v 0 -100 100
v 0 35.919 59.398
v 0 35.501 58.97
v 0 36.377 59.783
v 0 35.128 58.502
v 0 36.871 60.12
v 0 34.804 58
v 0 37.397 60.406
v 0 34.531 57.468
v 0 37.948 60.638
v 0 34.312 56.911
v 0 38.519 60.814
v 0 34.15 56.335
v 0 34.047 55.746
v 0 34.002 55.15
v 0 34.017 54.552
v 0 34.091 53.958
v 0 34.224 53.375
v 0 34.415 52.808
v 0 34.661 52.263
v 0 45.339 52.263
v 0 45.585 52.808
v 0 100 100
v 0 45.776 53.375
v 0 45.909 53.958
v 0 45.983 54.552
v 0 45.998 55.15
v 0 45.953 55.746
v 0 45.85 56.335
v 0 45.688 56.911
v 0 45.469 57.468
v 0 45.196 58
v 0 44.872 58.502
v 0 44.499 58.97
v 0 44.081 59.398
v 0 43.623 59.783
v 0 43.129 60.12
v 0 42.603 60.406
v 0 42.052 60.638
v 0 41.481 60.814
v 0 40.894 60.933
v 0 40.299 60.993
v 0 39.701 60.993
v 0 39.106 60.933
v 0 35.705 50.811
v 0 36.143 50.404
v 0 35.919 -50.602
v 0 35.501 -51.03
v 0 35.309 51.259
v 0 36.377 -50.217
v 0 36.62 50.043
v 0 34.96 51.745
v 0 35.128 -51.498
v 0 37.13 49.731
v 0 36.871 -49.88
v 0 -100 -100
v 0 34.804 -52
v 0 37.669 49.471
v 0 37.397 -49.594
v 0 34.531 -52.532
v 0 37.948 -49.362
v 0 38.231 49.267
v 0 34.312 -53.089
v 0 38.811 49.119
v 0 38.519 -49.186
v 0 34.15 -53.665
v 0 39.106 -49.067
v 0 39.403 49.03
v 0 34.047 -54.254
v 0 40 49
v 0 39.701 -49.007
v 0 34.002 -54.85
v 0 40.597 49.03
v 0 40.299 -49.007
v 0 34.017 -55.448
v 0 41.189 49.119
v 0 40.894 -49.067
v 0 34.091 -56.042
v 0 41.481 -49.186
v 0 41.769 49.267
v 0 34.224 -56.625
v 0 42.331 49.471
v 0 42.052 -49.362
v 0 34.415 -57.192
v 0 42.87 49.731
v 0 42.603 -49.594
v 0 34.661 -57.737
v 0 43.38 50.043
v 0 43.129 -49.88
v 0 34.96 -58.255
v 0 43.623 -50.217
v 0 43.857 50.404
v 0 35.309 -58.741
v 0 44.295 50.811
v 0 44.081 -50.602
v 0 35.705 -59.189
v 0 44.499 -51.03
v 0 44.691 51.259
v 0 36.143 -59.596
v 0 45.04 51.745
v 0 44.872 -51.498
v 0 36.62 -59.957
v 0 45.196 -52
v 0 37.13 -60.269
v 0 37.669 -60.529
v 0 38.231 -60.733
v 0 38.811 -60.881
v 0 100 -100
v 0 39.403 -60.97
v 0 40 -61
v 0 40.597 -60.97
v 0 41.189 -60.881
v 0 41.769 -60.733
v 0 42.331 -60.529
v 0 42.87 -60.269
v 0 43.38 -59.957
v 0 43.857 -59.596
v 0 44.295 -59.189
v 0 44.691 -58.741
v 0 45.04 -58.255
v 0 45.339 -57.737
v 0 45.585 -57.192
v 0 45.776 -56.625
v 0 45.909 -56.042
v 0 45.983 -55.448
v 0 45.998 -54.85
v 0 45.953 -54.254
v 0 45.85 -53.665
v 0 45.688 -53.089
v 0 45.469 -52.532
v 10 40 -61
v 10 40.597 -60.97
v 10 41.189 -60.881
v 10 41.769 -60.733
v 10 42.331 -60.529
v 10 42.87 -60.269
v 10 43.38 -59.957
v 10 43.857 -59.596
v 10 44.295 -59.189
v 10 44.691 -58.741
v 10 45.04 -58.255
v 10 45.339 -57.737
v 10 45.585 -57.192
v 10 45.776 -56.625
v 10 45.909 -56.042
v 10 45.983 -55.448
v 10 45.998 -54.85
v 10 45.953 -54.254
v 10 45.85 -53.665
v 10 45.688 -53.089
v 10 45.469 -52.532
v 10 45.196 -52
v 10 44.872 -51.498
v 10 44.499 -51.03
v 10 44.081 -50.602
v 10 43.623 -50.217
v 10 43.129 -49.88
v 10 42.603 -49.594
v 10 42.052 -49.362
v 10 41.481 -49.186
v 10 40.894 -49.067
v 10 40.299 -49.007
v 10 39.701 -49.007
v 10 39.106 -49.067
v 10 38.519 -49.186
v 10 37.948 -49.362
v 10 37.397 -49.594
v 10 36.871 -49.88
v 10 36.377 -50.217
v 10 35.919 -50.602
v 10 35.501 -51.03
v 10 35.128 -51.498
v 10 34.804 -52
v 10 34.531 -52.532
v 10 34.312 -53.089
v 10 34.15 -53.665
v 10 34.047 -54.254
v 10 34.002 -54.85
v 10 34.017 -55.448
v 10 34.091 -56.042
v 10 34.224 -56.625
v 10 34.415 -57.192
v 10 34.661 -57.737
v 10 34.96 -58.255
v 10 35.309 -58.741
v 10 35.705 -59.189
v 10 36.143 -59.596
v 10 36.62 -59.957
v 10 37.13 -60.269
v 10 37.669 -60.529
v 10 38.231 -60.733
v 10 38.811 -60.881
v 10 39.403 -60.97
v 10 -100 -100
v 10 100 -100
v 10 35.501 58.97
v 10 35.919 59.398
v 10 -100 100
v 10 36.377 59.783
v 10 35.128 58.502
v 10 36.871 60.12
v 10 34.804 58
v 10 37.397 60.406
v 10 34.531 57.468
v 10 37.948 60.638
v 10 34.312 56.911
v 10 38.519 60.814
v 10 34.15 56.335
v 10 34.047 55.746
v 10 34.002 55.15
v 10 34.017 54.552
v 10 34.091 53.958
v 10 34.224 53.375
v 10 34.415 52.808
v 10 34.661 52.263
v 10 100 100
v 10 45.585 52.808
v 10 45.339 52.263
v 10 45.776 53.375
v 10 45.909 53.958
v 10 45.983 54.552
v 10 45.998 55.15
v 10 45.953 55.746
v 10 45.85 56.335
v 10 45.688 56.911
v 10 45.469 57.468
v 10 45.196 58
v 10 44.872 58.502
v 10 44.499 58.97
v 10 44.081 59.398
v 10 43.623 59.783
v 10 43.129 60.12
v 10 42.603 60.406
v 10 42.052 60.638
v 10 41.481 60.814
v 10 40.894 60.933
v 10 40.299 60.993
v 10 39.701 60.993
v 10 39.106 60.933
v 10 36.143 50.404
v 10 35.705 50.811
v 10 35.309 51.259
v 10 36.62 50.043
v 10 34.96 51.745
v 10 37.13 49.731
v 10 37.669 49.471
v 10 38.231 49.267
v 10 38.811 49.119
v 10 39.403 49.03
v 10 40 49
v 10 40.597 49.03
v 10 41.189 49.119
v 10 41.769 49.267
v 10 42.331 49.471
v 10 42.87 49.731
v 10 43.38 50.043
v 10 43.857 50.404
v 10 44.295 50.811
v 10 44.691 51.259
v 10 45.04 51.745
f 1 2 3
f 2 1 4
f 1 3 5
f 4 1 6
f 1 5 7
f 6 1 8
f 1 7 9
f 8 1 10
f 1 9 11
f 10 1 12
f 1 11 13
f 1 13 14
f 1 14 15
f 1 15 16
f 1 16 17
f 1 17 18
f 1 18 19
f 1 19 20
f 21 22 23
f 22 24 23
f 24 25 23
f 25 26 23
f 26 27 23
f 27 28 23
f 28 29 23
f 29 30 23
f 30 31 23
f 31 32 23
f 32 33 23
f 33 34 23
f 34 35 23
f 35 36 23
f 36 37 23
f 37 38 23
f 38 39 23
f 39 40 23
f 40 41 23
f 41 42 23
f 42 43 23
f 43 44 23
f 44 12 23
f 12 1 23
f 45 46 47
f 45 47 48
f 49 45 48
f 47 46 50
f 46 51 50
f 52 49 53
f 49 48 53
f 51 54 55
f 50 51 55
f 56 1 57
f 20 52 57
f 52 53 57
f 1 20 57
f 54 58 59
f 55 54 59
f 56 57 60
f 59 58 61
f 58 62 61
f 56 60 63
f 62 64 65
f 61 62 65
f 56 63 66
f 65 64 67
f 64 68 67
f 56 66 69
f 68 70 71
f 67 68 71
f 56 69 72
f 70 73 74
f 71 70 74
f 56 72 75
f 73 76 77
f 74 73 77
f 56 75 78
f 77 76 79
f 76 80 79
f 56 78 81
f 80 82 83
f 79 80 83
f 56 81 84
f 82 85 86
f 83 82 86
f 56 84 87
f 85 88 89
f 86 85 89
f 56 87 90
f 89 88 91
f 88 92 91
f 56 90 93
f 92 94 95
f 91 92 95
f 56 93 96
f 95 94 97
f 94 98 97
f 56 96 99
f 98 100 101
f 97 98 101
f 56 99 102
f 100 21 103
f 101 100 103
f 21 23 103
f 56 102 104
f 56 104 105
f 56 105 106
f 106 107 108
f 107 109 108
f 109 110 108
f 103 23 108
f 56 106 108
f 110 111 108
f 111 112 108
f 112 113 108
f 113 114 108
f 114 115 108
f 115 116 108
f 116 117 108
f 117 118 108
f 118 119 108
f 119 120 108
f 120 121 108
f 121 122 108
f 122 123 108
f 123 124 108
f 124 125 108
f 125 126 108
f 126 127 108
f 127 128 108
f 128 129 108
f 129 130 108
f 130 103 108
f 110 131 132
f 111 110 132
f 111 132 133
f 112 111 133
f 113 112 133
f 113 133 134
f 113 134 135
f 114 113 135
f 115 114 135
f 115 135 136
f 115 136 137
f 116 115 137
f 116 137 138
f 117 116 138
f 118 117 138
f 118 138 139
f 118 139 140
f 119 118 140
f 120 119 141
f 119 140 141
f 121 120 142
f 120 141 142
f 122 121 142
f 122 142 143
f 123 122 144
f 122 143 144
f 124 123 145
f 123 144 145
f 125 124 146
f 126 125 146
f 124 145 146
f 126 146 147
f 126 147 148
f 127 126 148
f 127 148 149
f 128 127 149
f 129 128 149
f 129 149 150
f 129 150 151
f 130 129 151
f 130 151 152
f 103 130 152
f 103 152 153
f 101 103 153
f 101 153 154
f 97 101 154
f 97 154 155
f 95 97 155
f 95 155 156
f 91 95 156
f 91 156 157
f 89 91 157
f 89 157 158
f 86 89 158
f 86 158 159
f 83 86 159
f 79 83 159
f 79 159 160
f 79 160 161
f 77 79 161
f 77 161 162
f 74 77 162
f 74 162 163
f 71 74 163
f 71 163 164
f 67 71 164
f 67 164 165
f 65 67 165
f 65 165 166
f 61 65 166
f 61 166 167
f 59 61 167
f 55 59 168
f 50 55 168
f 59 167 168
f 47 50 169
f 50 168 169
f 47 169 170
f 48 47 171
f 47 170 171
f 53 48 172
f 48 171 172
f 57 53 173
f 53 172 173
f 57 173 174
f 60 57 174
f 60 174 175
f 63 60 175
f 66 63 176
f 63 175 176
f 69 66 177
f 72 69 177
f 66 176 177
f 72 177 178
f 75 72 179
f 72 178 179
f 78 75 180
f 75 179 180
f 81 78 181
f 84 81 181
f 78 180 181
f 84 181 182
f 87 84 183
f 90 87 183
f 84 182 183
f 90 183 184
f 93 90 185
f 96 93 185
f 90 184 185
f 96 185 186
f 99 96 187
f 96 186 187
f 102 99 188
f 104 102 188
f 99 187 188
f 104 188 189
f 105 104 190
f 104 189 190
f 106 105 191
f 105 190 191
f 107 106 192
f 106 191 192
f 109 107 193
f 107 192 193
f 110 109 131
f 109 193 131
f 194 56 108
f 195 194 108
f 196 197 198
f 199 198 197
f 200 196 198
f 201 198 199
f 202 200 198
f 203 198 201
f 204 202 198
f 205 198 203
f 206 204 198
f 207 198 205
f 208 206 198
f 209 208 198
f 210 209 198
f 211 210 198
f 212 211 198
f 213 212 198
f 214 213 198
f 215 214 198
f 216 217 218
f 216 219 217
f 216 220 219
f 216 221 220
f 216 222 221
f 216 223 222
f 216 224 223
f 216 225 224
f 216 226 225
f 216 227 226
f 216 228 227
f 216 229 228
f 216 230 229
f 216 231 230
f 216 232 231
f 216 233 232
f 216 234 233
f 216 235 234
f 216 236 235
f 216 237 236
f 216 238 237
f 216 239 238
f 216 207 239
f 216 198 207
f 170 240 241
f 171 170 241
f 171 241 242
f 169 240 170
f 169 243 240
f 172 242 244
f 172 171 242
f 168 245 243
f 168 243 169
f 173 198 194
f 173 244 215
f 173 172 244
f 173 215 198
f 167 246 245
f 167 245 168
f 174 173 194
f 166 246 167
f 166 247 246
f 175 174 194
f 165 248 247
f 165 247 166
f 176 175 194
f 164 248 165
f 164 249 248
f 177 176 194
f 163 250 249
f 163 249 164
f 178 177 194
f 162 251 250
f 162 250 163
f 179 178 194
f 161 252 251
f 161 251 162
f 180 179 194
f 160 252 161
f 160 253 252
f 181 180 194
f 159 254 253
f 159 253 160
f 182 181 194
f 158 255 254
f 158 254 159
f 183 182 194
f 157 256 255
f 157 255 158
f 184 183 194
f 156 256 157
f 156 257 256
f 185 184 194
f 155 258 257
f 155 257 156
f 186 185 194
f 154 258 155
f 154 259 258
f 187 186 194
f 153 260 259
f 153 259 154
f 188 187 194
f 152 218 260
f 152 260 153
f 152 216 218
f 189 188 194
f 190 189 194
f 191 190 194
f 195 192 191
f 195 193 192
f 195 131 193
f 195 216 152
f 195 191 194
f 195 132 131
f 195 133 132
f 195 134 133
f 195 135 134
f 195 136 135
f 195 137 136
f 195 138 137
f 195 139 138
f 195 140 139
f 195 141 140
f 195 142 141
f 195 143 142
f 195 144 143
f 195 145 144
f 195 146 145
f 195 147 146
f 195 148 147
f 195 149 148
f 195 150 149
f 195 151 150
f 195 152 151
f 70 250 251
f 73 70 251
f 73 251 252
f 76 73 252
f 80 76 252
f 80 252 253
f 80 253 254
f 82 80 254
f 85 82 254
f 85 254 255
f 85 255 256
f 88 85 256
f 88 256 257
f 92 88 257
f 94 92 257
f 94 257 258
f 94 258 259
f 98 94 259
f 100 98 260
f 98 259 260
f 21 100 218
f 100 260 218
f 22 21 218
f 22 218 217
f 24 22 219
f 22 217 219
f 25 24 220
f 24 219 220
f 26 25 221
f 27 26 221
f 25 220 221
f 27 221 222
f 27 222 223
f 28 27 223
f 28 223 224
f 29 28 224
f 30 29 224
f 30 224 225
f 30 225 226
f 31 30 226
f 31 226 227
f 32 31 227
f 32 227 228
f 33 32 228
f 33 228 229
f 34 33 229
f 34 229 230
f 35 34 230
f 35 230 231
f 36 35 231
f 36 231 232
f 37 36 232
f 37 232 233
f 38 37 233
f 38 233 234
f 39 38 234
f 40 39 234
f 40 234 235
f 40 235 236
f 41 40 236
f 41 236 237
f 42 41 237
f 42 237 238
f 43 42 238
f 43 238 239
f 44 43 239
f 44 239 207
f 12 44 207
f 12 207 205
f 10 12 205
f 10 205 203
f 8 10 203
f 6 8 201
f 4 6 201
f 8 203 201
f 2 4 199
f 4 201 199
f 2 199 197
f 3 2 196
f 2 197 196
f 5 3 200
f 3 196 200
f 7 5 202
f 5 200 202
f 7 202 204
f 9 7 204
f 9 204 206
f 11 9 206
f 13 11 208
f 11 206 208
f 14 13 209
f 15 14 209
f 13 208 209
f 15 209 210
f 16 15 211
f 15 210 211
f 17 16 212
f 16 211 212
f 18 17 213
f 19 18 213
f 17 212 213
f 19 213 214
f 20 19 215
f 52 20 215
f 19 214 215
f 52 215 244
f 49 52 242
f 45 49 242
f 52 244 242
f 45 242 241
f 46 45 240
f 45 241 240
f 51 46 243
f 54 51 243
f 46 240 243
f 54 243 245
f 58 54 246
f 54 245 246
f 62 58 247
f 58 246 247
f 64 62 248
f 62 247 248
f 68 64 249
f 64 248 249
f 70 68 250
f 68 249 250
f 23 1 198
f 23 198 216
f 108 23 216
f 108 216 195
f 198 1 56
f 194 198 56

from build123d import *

# Parameters (mm, degrees)
SKETCH1_W           = 200
SKETCH1_H           = 200
BOSS_EXTRUDE1_DEPTH = 10
CUT_EXTRUDE1_REACH  = 143.774
SKETCH2_R           = 6


with BuildPart() as part:
    # Sketch1 → Boss-Extrude1 (new body)
    with BuildSketch(Plane(origin=(0, 0, 0), x_dir=(0, 0, -1), z_dir=(1, 0, 0))):
        Rectangle(SKETCH1_W, SKETCH1_H)
    extrude(amount=BOSS_EXTRUDE1_DEPTH)

    # Sketch2 → Cut-Extrude1 (cut, up to next)
    with BuildSketch(Plane(origin=(10, 0, 0), x_dir=(0, 0, -1), z_dir=(1, 0, 0)), mode=Mode.PRIVATE) as cut_extrude1_sk1:
        with Locations((-55, 40)):
            Circle(SKETCH2_R)
    cut_extrude1_tool1 = extrude(cut_extrude1_sk1.sketch, amount=-CUT_EXTRUDE1_REACH, mode=Mode.PRIVATE) & part.part
    # Sketch2 → Cut-Extrude1 (cut, up to next)
    with BuildSketch(Plane(origin=(10, 0, 0), x_dir=(0, 0, -1), z_dir=(1, 0, 0)), mode=Mode.PRIVATE) as cut_extrude1_sk2:
        with Locations((55, 40)):
            Circle(SKETCH2_R)
    cut_extrude1_tool2 = extrude(cut_extrude1_sk2.sketch, amount=-CUT_EXTRUDE1_REACH, mode=Mode.PRIVATE) & part.part
    add(cut_extrude1_tool1.solids().sort_by_distance((10, 40, 55))[0], mode=Mode.SUBTRACT)
    add(cut_extrude1_tool2.solids().sort_by_distance((10, 40, -55))[0], mode=Mode.SUBTRACT)


solid = part.part
